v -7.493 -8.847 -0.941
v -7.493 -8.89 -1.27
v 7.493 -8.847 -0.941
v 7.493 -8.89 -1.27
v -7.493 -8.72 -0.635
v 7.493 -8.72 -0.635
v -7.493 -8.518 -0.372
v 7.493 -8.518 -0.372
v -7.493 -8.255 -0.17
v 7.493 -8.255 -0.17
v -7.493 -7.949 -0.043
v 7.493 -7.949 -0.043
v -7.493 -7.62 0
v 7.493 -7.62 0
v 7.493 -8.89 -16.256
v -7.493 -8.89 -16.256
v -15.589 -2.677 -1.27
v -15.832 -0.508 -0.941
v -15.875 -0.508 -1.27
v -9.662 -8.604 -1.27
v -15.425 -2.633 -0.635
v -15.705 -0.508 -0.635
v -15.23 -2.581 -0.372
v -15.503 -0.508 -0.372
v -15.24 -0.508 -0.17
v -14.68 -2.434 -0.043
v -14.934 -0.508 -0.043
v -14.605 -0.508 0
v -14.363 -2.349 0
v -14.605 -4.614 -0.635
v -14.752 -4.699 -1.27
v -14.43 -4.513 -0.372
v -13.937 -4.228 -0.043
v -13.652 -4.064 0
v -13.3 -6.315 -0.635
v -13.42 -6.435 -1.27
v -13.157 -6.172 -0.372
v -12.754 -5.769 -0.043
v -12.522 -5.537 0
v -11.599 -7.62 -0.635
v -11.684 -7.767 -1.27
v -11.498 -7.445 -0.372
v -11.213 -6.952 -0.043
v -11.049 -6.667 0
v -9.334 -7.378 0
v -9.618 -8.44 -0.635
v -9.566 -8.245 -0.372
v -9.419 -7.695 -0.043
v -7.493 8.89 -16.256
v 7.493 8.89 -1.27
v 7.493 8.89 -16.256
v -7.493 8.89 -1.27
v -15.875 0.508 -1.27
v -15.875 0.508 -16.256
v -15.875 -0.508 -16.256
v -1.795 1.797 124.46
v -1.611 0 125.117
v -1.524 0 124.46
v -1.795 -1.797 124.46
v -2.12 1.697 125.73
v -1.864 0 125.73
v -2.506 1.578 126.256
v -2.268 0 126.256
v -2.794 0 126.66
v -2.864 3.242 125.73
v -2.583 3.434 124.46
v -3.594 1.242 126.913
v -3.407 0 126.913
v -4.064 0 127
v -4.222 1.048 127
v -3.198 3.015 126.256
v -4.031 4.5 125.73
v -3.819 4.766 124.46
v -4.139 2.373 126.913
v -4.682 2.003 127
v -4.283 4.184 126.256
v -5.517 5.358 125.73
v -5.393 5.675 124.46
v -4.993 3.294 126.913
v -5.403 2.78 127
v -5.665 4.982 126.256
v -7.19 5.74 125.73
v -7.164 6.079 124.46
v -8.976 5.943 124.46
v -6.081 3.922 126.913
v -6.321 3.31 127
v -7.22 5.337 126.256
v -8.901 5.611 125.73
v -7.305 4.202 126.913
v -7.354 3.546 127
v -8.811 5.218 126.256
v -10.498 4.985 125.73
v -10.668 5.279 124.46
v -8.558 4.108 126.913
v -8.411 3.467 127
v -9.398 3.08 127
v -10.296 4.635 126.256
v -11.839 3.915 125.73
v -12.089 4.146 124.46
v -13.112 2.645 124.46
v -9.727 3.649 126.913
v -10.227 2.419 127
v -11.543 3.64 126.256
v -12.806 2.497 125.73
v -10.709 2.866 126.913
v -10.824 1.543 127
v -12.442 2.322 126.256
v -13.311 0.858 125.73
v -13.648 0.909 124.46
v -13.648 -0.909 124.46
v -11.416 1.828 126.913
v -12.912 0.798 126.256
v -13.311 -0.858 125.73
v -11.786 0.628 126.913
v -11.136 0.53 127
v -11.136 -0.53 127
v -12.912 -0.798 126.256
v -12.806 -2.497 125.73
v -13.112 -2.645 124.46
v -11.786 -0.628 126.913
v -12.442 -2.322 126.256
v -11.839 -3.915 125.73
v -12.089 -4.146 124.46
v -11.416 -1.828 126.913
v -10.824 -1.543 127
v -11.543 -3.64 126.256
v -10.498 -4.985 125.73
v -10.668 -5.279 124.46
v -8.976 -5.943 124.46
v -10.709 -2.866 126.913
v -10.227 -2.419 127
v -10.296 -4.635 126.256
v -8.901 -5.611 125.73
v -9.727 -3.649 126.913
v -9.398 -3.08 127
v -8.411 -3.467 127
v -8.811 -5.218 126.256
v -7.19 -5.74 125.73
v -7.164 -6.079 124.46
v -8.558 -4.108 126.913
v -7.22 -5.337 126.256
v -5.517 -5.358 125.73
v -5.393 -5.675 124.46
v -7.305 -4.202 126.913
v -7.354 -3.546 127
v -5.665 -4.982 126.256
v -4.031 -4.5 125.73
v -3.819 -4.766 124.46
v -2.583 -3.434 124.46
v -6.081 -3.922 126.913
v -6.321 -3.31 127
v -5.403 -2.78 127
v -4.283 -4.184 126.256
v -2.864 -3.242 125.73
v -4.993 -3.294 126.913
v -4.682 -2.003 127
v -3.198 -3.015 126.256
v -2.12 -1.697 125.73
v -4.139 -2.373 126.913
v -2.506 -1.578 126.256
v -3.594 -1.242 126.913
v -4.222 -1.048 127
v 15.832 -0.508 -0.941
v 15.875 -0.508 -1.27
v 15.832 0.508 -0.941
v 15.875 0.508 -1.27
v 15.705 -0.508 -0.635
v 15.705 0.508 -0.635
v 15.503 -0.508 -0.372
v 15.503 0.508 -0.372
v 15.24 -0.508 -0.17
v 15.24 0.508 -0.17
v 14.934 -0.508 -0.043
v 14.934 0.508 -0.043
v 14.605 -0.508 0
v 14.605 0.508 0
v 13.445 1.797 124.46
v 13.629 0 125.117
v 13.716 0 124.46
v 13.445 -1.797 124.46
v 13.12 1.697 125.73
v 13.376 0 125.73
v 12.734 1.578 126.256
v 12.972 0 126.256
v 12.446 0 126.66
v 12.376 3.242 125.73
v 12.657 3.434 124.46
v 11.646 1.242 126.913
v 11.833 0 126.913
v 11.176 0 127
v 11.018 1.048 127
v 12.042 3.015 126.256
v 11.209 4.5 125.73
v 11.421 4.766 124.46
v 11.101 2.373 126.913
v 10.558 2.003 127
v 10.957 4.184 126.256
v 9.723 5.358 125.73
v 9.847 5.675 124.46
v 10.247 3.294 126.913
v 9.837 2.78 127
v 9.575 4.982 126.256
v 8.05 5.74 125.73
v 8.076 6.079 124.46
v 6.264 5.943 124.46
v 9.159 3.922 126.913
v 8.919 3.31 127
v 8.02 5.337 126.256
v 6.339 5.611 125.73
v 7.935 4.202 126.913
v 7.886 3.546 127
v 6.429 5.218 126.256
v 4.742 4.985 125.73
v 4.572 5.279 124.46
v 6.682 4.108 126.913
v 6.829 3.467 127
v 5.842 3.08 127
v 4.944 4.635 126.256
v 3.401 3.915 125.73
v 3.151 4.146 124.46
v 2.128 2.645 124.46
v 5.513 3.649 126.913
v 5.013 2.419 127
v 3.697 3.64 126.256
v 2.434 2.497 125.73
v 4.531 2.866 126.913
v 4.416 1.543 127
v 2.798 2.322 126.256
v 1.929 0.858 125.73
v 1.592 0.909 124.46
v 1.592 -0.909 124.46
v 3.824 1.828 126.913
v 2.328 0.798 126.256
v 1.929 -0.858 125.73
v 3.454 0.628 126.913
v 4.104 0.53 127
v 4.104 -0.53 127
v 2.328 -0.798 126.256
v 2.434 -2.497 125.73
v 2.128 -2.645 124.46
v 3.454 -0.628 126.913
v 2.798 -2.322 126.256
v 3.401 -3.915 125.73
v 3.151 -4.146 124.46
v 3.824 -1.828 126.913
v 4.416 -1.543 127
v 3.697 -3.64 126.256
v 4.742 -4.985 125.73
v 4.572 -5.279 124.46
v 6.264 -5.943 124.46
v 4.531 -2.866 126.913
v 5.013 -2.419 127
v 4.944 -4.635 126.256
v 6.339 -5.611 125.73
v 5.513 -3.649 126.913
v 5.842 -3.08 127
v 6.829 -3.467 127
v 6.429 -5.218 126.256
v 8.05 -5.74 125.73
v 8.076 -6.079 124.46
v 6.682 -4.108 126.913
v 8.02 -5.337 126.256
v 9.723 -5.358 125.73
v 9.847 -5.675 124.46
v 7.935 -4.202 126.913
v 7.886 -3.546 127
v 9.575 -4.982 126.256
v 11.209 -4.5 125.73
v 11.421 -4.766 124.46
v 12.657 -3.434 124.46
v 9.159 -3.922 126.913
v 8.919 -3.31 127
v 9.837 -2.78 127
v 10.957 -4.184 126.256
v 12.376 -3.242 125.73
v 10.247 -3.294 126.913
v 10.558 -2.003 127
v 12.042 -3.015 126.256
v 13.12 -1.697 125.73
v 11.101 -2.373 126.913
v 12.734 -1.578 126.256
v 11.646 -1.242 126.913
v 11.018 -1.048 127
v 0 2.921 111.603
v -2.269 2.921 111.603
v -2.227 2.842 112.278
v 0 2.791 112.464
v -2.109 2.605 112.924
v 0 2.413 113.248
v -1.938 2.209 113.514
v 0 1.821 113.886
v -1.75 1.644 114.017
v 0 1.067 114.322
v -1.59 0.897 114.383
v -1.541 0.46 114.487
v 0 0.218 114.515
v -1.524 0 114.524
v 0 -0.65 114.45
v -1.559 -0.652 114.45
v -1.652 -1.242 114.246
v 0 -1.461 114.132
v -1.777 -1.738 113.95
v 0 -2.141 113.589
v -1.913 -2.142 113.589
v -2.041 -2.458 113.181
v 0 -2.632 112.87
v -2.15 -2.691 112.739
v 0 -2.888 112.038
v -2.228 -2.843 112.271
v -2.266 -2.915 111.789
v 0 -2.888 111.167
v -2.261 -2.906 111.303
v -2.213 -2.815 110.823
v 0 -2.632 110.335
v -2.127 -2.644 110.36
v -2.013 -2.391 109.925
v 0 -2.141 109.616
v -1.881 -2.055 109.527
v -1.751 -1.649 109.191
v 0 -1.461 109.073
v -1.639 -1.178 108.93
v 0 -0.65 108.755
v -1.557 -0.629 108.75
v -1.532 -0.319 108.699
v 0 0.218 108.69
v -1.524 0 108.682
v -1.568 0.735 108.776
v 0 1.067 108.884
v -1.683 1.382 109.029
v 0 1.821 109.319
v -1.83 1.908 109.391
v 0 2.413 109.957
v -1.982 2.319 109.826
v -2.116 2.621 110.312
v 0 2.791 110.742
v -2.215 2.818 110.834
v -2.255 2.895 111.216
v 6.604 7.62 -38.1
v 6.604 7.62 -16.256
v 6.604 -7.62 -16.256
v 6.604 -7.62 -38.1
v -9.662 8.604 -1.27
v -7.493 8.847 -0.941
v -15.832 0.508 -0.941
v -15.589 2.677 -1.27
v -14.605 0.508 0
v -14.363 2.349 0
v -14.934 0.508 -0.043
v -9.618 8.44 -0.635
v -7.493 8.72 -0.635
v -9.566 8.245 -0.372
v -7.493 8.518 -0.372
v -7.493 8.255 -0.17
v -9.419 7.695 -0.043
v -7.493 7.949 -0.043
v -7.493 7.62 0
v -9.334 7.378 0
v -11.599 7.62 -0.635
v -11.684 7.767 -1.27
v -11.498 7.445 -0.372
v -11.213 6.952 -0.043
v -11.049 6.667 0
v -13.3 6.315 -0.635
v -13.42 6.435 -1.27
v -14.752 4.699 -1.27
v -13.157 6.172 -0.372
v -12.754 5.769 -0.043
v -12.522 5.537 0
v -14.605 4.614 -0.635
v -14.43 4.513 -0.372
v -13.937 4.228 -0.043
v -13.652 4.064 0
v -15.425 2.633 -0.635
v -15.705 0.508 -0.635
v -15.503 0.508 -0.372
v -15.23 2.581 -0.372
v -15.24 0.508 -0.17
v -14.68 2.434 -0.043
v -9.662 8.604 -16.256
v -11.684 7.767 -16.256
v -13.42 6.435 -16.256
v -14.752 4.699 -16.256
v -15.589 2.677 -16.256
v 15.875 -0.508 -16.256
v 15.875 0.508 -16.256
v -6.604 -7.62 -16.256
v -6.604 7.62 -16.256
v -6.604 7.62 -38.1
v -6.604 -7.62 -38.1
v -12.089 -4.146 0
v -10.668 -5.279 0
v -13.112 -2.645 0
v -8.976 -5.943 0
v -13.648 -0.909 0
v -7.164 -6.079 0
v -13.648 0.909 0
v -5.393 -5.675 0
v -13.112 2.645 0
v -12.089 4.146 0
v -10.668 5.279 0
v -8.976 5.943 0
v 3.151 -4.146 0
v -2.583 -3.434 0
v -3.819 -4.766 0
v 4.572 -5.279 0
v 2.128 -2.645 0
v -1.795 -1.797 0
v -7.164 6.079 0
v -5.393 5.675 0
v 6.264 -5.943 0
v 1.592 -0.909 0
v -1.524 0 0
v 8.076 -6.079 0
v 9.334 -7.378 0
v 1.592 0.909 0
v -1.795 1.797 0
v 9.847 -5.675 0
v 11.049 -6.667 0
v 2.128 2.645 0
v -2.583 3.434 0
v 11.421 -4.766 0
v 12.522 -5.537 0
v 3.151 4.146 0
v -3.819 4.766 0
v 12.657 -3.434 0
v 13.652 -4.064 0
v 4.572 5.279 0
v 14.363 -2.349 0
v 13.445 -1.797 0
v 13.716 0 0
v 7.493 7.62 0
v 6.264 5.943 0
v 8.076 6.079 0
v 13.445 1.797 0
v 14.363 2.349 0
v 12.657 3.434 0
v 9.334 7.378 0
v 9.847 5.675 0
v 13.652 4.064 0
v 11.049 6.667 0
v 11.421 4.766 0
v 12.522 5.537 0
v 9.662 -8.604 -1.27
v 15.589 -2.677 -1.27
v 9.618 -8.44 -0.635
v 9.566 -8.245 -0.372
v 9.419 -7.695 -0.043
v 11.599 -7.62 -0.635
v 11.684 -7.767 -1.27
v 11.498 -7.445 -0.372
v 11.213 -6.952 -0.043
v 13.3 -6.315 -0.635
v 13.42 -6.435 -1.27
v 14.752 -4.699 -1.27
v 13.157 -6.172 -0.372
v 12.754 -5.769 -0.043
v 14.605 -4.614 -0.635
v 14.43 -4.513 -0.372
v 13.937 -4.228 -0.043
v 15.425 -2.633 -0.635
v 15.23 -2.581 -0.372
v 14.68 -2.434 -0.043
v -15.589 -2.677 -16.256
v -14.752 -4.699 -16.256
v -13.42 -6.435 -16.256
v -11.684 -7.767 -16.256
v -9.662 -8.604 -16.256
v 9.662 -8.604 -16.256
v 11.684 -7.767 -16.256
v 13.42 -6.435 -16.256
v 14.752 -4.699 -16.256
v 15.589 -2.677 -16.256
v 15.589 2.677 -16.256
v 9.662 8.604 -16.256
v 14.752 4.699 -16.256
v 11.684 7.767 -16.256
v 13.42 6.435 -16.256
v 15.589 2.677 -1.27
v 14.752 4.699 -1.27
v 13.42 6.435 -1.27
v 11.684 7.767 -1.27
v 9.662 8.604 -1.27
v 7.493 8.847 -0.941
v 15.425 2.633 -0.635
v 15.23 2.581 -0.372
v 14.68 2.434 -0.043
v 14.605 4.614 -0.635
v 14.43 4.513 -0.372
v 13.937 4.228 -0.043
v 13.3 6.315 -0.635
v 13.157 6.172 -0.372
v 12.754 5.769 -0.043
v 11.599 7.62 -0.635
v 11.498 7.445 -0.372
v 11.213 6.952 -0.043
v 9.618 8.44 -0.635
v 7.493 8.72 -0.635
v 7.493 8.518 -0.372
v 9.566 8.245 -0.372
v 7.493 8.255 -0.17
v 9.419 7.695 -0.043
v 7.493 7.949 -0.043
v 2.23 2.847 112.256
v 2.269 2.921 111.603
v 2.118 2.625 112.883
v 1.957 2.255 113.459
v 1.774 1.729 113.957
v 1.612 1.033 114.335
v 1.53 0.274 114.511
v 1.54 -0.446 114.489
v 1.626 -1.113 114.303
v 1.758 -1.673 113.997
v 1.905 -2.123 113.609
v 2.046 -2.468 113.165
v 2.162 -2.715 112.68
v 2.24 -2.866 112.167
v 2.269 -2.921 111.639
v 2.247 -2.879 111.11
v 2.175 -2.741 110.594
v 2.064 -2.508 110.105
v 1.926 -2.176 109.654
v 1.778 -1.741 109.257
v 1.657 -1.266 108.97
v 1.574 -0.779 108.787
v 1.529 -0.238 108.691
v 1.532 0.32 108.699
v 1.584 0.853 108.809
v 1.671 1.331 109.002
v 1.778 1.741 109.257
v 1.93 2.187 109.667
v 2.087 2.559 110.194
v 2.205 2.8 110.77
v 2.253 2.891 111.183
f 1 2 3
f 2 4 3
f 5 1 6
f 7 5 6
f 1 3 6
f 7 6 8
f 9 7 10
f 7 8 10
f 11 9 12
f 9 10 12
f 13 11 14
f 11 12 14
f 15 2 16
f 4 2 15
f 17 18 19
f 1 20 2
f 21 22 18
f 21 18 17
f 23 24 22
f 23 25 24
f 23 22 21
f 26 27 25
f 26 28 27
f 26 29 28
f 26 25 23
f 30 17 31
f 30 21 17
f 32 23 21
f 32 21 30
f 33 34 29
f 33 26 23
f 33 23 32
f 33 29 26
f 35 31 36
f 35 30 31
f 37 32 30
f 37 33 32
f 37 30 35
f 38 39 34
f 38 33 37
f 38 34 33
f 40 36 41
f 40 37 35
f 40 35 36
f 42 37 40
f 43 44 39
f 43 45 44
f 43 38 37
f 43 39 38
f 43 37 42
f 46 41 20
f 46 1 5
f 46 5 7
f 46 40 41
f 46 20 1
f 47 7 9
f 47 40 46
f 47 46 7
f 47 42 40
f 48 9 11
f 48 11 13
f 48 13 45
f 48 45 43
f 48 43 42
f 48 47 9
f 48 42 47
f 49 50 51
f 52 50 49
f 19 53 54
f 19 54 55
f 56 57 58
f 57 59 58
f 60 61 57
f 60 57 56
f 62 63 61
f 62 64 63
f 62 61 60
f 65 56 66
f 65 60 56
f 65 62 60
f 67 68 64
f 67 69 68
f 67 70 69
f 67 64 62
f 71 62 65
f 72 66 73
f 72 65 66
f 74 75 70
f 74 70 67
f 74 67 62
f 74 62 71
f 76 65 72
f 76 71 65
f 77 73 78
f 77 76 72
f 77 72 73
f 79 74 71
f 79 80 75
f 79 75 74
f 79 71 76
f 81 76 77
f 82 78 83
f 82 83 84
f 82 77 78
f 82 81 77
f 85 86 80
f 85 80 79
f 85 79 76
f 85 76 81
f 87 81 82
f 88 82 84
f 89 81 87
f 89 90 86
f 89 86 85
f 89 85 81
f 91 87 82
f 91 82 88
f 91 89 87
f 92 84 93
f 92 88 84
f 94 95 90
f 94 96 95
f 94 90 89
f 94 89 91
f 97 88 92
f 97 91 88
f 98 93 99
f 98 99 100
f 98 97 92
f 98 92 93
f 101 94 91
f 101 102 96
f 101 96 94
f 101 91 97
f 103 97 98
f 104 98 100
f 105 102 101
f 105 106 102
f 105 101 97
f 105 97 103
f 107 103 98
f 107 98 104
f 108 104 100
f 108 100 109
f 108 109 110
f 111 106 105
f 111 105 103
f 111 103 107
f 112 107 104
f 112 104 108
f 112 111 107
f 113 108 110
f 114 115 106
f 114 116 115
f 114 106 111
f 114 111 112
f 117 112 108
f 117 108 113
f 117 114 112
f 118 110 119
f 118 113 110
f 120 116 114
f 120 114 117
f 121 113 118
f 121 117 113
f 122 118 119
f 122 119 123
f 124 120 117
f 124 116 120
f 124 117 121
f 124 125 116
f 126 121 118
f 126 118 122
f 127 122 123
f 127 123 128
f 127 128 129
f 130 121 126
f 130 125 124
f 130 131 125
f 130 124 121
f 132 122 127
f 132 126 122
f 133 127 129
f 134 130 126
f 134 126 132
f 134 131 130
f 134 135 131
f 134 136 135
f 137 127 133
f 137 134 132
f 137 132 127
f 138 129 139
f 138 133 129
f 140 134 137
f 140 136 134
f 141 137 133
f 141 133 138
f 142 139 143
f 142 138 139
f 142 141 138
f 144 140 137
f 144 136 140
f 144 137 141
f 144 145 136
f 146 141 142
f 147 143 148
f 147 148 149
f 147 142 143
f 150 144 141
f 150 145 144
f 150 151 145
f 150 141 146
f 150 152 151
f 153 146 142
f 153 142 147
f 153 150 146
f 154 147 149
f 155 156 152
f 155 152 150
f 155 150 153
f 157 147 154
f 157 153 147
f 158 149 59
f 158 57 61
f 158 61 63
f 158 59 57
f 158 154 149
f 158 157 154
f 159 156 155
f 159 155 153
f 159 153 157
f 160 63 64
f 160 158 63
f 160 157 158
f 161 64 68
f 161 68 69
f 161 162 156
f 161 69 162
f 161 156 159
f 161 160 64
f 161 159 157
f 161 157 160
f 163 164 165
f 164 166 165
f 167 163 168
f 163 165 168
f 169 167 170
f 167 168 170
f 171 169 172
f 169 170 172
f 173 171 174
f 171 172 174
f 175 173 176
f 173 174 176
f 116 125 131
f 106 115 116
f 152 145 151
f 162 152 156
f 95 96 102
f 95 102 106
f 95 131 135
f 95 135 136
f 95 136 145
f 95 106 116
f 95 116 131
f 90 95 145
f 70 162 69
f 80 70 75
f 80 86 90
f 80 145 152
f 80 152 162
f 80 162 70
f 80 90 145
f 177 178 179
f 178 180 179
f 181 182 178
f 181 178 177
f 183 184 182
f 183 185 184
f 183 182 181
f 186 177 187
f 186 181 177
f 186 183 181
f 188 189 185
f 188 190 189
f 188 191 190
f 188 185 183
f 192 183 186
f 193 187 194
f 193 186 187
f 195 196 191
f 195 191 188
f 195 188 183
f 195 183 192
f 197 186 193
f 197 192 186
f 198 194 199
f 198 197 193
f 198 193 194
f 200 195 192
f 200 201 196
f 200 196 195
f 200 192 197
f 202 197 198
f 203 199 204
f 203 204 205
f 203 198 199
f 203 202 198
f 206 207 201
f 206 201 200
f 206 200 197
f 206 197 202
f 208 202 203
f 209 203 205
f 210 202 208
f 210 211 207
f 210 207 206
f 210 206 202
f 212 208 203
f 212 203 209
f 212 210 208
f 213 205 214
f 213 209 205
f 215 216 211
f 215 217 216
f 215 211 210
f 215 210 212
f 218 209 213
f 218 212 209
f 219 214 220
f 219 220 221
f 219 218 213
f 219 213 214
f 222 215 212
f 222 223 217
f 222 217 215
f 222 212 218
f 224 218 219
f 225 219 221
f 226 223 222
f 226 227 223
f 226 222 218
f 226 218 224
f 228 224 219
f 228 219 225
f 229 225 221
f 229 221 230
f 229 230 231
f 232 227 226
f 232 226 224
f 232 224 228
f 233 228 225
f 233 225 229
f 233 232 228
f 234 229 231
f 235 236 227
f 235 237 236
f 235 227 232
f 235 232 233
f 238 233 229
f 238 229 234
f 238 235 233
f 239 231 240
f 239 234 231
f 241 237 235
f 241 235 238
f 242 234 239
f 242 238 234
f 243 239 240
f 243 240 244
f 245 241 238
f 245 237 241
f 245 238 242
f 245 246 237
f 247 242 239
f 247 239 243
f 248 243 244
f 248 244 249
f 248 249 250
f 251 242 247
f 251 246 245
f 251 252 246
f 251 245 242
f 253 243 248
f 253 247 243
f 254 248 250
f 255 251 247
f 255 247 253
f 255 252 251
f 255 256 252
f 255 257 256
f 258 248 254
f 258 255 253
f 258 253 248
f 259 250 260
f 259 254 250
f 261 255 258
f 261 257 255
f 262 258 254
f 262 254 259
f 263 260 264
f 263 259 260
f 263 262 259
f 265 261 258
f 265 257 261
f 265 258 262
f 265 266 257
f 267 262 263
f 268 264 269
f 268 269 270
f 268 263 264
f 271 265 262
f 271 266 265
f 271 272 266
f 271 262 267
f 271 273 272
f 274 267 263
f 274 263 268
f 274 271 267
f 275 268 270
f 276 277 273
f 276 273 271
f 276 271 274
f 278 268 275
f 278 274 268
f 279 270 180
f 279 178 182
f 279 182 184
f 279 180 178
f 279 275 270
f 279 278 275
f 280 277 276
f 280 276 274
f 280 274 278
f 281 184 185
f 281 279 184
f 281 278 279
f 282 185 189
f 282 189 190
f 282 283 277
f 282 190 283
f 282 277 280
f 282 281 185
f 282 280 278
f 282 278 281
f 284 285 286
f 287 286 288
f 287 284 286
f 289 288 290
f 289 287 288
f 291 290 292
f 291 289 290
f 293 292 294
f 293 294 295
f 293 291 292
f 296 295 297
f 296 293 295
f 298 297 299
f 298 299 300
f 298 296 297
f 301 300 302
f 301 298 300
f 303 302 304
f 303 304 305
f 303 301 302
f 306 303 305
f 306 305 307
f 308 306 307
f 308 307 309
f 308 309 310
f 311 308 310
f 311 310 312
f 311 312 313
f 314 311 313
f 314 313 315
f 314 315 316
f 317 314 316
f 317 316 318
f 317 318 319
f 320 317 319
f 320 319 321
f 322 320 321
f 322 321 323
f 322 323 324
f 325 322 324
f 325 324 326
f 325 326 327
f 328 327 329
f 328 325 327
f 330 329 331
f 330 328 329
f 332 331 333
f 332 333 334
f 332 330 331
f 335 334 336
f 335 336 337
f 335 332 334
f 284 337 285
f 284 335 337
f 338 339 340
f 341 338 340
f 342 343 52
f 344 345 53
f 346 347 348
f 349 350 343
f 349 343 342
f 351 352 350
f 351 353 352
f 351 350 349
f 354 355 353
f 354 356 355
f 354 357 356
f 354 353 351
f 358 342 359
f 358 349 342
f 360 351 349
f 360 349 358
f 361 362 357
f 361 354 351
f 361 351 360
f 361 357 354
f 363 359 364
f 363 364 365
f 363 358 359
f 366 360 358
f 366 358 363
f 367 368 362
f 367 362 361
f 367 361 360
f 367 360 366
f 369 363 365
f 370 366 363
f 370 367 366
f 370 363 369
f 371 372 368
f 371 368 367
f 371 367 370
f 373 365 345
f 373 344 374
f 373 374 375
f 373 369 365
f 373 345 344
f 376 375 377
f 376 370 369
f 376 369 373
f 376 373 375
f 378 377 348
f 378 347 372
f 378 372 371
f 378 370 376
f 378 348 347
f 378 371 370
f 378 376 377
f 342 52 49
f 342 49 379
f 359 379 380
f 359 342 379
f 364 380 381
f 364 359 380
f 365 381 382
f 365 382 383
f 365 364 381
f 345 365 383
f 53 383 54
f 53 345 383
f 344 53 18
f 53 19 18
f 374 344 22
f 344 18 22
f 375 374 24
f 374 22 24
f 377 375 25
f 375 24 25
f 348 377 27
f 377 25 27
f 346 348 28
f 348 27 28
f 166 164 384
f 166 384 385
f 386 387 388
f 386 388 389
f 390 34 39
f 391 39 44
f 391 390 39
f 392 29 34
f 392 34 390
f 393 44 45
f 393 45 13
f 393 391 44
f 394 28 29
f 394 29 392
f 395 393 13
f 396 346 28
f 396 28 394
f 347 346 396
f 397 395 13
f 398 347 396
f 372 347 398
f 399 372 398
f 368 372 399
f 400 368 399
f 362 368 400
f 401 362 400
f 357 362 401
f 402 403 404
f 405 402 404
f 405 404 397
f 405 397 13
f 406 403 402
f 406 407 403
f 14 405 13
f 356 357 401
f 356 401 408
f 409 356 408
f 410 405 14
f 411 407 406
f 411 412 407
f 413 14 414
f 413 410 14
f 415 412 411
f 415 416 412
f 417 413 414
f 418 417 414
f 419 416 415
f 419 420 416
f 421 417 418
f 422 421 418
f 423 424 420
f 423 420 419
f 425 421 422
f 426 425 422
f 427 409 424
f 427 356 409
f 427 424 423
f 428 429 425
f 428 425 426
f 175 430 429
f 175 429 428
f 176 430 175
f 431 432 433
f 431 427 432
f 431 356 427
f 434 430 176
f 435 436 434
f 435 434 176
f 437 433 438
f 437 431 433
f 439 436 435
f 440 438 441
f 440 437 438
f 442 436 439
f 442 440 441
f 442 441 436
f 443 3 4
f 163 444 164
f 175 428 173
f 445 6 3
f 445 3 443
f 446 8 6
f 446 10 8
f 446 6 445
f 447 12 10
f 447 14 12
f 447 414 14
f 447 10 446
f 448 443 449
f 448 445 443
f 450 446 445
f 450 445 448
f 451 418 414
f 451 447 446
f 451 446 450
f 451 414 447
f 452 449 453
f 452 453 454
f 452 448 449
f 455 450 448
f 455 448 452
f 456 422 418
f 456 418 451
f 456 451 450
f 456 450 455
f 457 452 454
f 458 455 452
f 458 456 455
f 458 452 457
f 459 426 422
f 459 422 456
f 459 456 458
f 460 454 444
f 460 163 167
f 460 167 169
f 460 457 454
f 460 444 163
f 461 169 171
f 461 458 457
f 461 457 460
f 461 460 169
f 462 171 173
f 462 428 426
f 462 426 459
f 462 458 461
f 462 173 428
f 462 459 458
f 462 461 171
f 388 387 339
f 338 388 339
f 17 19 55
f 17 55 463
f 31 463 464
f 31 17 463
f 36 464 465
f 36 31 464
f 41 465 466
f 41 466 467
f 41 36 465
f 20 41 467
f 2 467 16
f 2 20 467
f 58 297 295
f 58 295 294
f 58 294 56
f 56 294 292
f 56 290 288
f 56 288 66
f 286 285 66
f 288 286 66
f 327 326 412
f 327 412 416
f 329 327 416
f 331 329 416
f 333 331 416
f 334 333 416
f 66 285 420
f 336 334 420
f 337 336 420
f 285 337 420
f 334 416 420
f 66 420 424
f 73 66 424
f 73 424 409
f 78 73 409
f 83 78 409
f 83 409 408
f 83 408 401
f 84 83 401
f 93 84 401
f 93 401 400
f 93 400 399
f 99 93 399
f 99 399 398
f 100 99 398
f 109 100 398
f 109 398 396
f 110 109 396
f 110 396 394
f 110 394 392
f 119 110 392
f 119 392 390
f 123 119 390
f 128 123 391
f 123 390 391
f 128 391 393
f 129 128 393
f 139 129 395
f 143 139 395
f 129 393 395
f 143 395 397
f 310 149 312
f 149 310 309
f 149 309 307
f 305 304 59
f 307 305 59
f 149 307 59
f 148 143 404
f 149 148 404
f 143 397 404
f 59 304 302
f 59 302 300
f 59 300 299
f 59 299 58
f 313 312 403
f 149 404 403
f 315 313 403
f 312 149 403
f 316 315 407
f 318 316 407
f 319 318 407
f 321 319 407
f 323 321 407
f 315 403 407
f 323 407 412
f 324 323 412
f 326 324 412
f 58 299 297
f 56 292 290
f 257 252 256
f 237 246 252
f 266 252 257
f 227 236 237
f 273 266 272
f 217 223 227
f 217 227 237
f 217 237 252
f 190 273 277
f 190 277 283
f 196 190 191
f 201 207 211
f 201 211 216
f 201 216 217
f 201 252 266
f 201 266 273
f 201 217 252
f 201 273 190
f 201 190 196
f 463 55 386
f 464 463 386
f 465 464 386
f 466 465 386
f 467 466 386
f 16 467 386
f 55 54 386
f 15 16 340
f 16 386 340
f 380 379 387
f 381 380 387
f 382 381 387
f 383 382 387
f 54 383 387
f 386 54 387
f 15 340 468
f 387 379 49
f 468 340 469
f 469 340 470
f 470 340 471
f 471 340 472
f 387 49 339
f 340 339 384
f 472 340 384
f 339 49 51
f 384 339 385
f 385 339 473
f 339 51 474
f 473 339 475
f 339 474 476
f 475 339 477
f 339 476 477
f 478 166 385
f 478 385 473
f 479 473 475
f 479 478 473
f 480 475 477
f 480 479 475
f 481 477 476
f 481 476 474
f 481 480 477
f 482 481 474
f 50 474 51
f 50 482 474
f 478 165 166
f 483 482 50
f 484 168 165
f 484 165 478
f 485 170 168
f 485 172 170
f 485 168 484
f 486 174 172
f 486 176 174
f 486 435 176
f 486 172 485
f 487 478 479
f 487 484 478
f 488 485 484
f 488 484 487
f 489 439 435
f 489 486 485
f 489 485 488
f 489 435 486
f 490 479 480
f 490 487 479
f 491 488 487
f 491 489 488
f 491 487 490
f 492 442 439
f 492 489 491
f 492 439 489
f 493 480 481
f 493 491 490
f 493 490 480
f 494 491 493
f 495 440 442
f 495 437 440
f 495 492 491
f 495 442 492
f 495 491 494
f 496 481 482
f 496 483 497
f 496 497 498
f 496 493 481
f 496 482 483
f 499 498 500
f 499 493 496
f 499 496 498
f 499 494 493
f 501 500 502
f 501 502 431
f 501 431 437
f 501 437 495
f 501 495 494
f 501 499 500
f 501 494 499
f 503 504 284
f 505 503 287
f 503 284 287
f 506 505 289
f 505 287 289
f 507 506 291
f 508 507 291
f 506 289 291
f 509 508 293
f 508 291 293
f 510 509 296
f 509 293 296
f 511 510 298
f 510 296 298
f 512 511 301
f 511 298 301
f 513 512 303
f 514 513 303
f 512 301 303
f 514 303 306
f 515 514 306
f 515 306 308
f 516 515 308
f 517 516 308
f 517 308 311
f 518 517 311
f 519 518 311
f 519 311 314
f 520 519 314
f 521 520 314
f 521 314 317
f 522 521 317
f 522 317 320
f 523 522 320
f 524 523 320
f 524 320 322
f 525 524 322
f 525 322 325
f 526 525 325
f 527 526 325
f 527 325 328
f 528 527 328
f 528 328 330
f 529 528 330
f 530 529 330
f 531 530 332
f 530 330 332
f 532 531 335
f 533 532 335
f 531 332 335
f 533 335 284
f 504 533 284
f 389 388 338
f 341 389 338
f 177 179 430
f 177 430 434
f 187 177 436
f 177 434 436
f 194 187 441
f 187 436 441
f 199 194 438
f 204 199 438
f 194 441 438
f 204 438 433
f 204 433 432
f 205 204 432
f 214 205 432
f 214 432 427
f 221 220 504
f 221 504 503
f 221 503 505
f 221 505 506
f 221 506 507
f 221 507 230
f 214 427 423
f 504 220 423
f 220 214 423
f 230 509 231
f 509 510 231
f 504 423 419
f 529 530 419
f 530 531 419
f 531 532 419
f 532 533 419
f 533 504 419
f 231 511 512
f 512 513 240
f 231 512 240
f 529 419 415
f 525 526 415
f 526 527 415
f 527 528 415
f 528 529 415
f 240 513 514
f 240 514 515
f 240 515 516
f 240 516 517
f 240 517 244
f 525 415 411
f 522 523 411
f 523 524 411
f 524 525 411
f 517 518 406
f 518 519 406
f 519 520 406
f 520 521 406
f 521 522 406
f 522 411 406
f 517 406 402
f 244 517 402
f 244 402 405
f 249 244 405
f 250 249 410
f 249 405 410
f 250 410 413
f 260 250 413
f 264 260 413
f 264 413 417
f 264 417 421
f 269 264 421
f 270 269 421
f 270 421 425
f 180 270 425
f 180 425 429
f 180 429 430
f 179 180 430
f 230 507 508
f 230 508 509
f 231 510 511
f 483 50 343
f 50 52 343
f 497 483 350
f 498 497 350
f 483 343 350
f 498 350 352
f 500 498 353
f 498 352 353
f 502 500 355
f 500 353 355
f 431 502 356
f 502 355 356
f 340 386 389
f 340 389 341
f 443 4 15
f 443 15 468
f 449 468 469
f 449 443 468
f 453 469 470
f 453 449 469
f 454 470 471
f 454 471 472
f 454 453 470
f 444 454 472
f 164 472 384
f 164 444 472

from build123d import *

# Parameters (mm, degrees)
F0_R          = 6.096
F1_DEPTH      = 127
F2_R          = 2.921
F3_DEPTH      = 5.08
F3_DEPTH_BACK = 5.08
F4_R          = 2.54
F6_DEPTH      = 16.256
F7_R          = 1.27
F8_W          = 13.208
F8_H          = 15.24
F9_DEPTH      = 21.844


with BuildPart() as f1:
    # F0 (on Top) → F1 (new body)
    with BuildSketch(Plane.XY):
        with Locations((7.62, 0)):
            Circle(F0_R)
        with Locations((-7.62, 0)):
            Circle(F0_R)
    extrude(amount=F1_DEPTH)

    # F2 (on Right) → F3 (join, two sides)
    with BuildSketch(Plane.YZ) as f3_sk:
        with Locations((0, 111.602642)):
            Circle(F2_R)
    extrude(amount=F3_DEPTH)
    extrude(f3_sk.sketch, amount=-F3_DEPTH_BACK)

    # F4
    f4_edges = [f1.edges().sort_by_distance(p)[0] for p in [
        (-13.716, 0, 127),
        (1.524, 0, 127),
    ]]
    fillet(f4_edges, radius=F4_R)

    # F5 (on Top) → F6 (join)
    with BuildSketch(Plane.XY):
        with BuildLine():
            ThreePointArc((-15.875, -0.508), (-13.419969, -6.434969), (-7.493, -8.89))
            Line((-7.493, -8.89), (7.493, -8.89))
            ThreePointArc((7.493, -8.89), (13.419969, -6.434969), (15.875, -0.508))
            Line((15.875, -0.508), (15.875, 0.508))
            ThreePointArc((15.875, 0.508), (13.419969, 6.434969), (7.493, 8.89))
            Line((7.493, 8.89), (-7.493, 8.89))
            ThreePointArc((-7.493, 8.89), (-13.419969, 6.434969), (-15.875, 0.508))
            Line((-15.875, 0.508), (-15.875, -0.508))
        make_face()
    extrude(amount=-F6_DEPTH)

    # F7
    f7_edges = [f1.edges().sort_by_distance(p)[0] for p in [
        (0, -8.89, 0),
    ]]
    fillet(f7_edges, radius=F7_R)

    # F8 (on face) → F9 (join)
    with BuildSketch(Plane(origin=(0, 0, -16.256), x_dir=(1, 0, 0), z_dir=(0, 0, -1))):
        Rectangle(F8_W, F8_H)
    extrude(amount=F9_DEPTH)


solid = f1.part
